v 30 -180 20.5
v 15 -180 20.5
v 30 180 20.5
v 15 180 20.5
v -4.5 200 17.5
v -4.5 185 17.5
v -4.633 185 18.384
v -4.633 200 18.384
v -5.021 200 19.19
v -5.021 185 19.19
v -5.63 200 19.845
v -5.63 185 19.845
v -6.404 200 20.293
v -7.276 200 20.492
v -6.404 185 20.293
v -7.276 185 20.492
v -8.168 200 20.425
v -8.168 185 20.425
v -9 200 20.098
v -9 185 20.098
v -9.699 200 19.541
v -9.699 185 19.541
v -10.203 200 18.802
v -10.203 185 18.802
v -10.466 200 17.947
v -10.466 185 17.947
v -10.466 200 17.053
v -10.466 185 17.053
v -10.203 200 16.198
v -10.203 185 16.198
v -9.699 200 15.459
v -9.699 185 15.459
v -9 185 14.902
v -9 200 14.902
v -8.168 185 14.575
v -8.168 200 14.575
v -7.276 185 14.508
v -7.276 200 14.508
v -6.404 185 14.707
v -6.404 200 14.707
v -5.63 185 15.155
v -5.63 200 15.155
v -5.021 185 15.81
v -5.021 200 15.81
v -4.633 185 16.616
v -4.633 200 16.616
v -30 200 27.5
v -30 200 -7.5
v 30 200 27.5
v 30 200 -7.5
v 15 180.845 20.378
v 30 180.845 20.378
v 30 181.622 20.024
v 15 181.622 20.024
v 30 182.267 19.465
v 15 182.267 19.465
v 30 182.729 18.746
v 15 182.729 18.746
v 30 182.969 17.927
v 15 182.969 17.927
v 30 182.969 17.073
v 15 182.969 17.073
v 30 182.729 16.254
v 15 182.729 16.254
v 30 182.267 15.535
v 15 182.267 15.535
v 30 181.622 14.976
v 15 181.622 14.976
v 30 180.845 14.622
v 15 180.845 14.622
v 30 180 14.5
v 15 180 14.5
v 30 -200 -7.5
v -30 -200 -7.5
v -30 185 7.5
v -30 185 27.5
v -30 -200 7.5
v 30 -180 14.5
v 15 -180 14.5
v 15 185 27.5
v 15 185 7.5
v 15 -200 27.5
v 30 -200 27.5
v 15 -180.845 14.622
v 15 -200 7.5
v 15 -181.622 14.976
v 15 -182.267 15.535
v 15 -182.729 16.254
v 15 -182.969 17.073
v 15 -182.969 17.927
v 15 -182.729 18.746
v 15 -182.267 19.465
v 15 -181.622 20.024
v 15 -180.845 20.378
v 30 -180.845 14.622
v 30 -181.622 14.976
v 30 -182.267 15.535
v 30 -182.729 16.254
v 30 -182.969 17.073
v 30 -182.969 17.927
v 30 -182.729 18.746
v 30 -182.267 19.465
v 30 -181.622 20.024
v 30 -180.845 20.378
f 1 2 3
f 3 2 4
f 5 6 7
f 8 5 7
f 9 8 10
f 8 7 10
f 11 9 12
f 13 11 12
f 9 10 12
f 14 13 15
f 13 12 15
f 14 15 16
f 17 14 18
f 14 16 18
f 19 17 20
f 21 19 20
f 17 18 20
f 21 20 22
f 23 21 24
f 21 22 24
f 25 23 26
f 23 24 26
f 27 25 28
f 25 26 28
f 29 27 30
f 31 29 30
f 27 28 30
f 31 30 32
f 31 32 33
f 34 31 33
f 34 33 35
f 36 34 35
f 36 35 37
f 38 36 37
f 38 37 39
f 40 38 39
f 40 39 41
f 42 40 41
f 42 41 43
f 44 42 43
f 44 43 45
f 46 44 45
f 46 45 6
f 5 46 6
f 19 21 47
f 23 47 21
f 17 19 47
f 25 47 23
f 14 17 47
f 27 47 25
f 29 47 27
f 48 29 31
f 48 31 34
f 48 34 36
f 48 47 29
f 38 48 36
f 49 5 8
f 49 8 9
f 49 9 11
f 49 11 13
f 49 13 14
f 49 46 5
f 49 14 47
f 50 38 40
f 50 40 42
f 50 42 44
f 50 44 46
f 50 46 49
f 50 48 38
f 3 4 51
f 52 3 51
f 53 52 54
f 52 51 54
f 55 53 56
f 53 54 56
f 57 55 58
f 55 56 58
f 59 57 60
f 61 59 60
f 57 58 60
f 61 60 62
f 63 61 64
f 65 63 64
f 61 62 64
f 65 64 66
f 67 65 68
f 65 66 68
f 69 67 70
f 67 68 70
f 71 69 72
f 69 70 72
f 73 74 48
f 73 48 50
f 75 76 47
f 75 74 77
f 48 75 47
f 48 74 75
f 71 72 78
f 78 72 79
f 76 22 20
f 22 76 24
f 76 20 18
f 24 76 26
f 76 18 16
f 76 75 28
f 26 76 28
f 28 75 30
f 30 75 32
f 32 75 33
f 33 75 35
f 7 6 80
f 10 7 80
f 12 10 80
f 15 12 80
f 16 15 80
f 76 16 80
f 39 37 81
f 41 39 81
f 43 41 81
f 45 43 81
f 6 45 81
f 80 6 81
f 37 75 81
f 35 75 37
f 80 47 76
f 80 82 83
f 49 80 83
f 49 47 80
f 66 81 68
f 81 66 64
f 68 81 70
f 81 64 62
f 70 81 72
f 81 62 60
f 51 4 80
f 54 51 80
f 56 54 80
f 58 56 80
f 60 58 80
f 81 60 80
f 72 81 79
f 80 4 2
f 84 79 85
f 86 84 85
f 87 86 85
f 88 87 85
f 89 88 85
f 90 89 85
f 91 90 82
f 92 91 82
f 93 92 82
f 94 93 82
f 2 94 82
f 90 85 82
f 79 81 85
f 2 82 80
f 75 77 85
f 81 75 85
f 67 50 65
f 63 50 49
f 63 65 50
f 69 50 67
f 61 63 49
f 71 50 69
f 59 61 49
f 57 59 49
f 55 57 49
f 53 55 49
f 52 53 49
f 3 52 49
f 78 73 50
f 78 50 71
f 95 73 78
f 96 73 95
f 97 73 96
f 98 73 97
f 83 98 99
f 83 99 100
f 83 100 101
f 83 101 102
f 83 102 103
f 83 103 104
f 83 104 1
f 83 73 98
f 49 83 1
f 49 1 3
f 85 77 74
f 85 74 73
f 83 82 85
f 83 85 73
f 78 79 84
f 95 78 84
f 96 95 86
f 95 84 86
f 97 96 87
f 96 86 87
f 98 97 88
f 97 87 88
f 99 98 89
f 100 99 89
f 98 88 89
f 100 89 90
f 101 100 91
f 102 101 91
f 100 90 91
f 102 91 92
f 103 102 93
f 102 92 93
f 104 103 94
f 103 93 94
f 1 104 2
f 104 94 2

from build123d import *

# Parameters (mm, degrees)
F0_W     = 60
F0_H     = 15
F1_DEPTH = 200
F2_W     = 15
F2_H     = 20
F3_DEPTH = 400
F5_DEPTH = 15.001
F6_W     = 45
F6_H     = 15
F7_DEPTH = 20
F8_R     = 3
F9_DEPTH = 15.001


with BuildPart() as f1:
    # F0 (on Front) → F1 (new body, symmetric)
    with BuildSketch(Plane.XZ):
        Rectangle(F0_W, F0_H)
    extrude(amount=F1_DEPTH, both=True)

    # F2 (on face) → F3 (join, through all)
    with BuildSketch(Plane.XZ.offset(200)):
        with Locations((22.5, 17.5)):
            Rectangle(F2_W, F2_H)
    extrude(amount=-F3_DEPTH)

    # F4 (on face) → F5 (cut, through all)
    with BuildSketch(Plane(origin=(15, 0, 0), x_dir=(0, -1, 0), z_dir=(-1, 0, 0))):
        with BuildLine():
            ThreePointArc((180, 14.5), (183, 17.5), (180, 20.5))
            Line((180, 20.5), (-180, 20.5))
            ThreePointArc((-180, 20.5), (-183, 17.5), (-180, 14.5))
            Line((-180, 14.5), (180, 14.5))
        make_face()
    extrude(amount=-F5_DEPTH, mode=Mode.SUBTRACT)

    # F6 (on face) → F7 (join)
    with BuildSketch(Plane.XY.offset(7.5)):
        with Locations((-7.5, 192.5)):
            Rectangle(F6_W, F6_H)
    extrude(amount=F7_DEPTH)

    # F8 (on face) → F9 (cut, through all)
    with BuildSketch(Plane.XZ.offset(-185)):
        with Locations((-7.5, 17.5)):
            Circle(F8_R)
    extrude(amount=-F9_DEPTH, mode=Mode.SUBTRACT)


solid = f1.part
